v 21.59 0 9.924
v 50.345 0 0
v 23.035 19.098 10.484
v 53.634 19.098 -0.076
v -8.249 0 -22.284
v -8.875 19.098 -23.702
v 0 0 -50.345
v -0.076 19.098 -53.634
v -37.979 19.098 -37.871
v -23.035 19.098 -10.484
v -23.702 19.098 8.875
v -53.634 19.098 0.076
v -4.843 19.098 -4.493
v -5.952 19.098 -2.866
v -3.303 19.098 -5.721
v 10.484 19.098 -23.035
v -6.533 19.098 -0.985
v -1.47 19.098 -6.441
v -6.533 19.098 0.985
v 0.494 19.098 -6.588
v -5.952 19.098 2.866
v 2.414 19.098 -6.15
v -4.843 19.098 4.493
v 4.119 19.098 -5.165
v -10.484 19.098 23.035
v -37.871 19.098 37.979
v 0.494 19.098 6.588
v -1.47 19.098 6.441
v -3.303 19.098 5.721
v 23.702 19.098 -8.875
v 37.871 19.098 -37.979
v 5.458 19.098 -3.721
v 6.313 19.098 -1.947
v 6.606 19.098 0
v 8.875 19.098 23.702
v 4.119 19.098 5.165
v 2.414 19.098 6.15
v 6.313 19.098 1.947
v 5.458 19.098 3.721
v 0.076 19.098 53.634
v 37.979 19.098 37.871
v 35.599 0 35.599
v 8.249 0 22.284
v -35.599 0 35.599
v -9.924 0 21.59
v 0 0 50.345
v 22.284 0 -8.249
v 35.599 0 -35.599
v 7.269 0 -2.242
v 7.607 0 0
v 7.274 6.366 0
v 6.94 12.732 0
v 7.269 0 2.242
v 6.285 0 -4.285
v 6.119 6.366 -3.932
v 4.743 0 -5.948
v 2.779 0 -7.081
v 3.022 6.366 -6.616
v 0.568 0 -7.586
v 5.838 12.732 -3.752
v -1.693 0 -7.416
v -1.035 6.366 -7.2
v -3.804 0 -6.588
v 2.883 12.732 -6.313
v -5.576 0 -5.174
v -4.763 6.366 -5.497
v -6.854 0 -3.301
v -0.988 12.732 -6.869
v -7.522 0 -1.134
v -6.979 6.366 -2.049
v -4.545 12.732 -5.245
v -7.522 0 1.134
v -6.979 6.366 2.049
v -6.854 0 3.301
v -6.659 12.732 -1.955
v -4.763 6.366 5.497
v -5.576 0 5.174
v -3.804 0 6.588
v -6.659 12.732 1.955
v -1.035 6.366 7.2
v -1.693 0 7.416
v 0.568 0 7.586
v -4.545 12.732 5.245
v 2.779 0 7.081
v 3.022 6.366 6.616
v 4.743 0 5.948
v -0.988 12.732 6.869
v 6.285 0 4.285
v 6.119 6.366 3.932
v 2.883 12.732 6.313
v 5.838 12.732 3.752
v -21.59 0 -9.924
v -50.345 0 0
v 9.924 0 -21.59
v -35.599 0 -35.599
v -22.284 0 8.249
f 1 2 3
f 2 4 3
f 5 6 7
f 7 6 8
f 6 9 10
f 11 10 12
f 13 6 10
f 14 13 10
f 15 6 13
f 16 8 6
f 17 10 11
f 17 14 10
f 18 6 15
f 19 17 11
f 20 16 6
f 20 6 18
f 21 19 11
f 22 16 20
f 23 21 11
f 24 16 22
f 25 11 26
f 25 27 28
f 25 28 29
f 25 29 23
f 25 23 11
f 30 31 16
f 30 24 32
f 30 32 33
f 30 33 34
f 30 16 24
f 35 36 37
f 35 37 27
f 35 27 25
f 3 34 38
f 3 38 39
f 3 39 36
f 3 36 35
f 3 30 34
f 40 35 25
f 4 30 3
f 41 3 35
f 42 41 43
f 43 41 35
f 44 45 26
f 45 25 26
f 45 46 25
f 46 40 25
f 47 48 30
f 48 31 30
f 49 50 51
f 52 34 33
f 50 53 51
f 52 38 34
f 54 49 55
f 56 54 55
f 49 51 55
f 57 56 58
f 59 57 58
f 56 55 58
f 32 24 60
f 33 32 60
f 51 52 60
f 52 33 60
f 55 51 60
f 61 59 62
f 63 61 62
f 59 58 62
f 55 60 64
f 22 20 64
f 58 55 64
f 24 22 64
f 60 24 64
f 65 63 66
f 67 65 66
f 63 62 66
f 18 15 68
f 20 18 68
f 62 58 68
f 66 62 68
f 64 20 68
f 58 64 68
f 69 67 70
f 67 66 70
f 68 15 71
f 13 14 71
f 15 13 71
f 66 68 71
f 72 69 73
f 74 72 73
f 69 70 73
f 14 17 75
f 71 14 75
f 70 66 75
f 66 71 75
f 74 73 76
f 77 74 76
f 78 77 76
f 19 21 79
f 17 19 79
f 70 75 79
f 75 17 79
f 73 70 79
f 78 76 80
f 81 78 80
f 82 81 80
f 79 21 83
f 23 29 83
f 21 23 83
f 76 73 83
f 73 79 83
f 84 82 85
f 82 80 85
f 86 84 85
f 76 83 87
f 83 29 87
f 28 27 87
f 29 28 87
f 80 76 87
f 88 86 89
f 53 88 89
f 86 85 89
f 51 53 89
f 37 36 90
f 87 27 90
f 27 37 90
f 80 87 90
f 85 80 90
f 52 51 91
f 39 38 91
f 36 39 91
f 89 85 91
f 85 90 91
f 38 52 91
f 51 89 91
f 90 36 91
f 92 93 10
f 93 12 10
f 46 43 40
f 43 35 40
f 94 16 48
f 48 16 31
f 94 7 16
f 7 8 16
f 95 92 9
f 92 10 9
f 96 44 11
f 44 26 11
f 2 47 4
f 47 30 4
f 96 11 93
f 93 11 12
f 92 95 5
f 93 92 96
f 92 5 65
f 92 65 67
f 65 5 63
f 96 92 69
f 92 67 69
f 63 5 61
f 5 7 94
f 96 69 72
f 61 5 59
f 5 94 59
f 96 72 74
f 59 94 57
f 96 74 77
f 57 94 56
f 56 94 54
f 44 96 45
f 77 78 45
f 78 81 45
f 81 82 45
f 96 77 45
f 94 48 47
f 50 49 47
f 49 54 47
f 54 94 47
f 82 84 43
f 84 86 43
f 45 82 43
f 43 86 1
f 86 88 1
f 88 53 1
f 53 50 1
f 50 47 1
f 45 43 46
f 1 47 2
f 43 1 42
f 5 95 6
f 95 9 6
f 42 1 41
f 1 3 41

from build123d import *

# Parameters (mm, degrees)
F0_R     = 7.6071600852
F1_DEPTH = 19.09754
F1_TAPER = -3


with BuildPart() as f1:
    # F0 (on Front) → F1 (new body)
    with BuildSketch(Plane.XZ):
        with BuildLine():
            ThreePointArc((-4.6388319141, 18.7061527472), (-1.4012654558, 19.2217420452), (1.8768469353, 19.1811458915))
            Line((1.8768469353, 19.1811458915), (8.2491056776, 22.2835490331))
            Line((8.2491056776, 22.2835490331), (0, 50.3449775279))
            Line((0, 50.3449775279), (-9.9238500669, 21.5898471936))
            Line((-9.9238500669, 21.5898471936), (-4.6388319141, 18.7061527472))
        make_face()
        with BuildLine():
            Line((9.9238500669, -21.5898471936), (4.6388319141, -18.7061527472))
            ThreePointArc((4.6388319141, -18.7061527472), (1.4012654558, -19.2217420452), (-1.8768469353, -19.1811458915))
            Line((-1.8768469353, -19.1811458915), (-8.2491056776, -22.2835490331))
            Line((-8.2491056776, -22.2835490331), (0, -50.3449775279))
            Line((0, -50.3449775279), (9.9238500669, -21.5898471936))
        make_face()
        with BuildLine():
            Line((-8.2491056776, -22.2835490331), (-1.8768469353, -19.1811458915))
            ThreePointArc((-1.8768469353, -19.1811458915), (-6.0612417477, -18.294815129), (-9.9470979542, -16.5073969607))
            Line((-9.9470979542, -16.5073969607), (-8.2491056776, -22.2835490331))
        make_face()
        with BuildLine():
            ThreePointArc((18.7061527472, 4.6388319141), (19.1305766639, 2.3366532985), (19.2727505076, 0))
            ThreePointArc((19.2727505076, 0), (19.2498357311, -0.9395405559), (19.1811458915, -1.8768469353))
            Line((19.1811458915, -1.8768469353), (22.2835490331, -8.2491056776))
            Line((22.2835490331, -8.2491056776), (50.3449775279, 0))
            Line((50.3449775279, 0), (21.5898471936, 9.9238500669))
            Line((21.5898471936, 9.9238500669), (18.7061527472, 4.6388319141))
        make_face()
        with BuildLine():
            Line((22.2835490331, -8.2491056776), (16.5073969607, -9.9470979542))
            ThreePointArc((16.5073969607, -9.9470979542), (14.5826684524, -12.6009798404), (12.2359871356, -14.890249526))
            Line((12.2359871356, -14.890249526), (9.9238500669, -21.5898471936))
            Line((9.9238500669, -21.5898471936), (35.5992750086, -35.5992750086))
            Line((35.5992750086, -35.5992750086), (22.2835490331, -8.2491056776))
        make_face()
        with BuildLine():
            ThreePointArc((14.890249526, 12.2359871356), (17.2223329805, 8.6504426961), (18.7061527472, 4.6388319141))
            Line((18.7061527472, 4.6388319141), (21.5898471936, 9.9238500669))
            Line((21.5898471936, 9.9238500669), (14.890249526, 12.2359871356))
        make_face()
        with BuildLine():
            ThreePointArc((1.8768469353, 19.1811458915), (6.0612417477, 18.294815129), (9.9470979542, 16.5073969607))
            Line((9.9470979542, 16.5073969607), (8.2491056776, 22.2835490331))
            Line((8.2491056776, 22.2835490331), (1.8768469353, 19.1811458915))
        make_face()
        with BuildLine():
            ThreePointArc((-19.1811458915, 1.8768469353), (-18.294815129, 6.0612417477), (-16.5073969607, 9.9470979542))
            Line((-16.5073969607, 9.9470979542), (-22.2835490331, 8.2491056776))
            Line((-22.2835490331, 8.2491056776), (-19.1811458915, 1.8768469353))
        make_face()
        with BuildLine():
            ThreePointArc((-12.2359871356, 14.890249526), (-8.6504426961, 17.2223329805), (-4.6388319141, 18.7061527472))
            Line((-4.6388319141, 18.7061527472), (-9.9238500669, 21.5898471936))
            Line((-9.9238500669, 21.5898471936), (-12.2359871356, 14.890249526))
        make_face()
        with BuildLine():
            Line((-21.5898471936, -9.9238500669), (-14.890249526, -12.2359871356))
            ThreePointArc((-14.890249526, -12.2359871356), (-17.2223329805, -8.6504426961), (-18.7061527472, -4.6388319141))
            Line((-18.7061527472, -4.6388319141), (-21.5898471936, -9.9238500669))
        make_face()
        with BuildLine():
            Line((9.9238500669, -21.5898471936), (12.2359871356, -14.890249526))
            ThreePointArc((12.2359871356, -14.890249526), (8.6504426961, -17.2223329805), (4.6388319141, -18.7061527472))
            Line((4.6388319141, -18.7061527472), (9.9238500669, -21.5898471936))
        make_face()
        with BuildLine():
            Line((22.2835490331, -8.2491056776), (19.1811458915, -1.8768469353))
            ThreePointArc((19.1811458915, -1.8768469353), (18.294815129, -6.0612417477), (16.5073969607, -9.9470979542))
            Line((16.5073969607, -9.9470979542), (22.2835490331, -8.2491056776))
        make_face()
        with BuildLine():
            ThreePointArc((9.9470979542, 16.5073969607), (12.6009798404, 14.5826684524), (14.890249526, 12.2359871356))
            Line((14.890249526, 12.2359871356), (21.5898471936, 9.9238500669))
            Line((21.5898471936, 9.9238500669), (35.5992750086, 35.5992750086))
            Line((35.5992750086, 35.5992750086), (8.2491056776, 22.2835490331))
            Line((8.2491056776, 22.2835490331), (9.9470979542, 16.5073969607))
        make_face()
        with BuildLine():
            ThreePointArc((-16.5073969607, 9.9470979542), (-14.5826684524, 12.6009798404), (-12.2359871356, 14.890249526))
            Line((-12.2359871356, 14.890249526), (-9.9238500669, 21.5898471936))
            Line((-9.9238500669, 21.5898471936), (-35.5992750086, 35.5992750086))
            Line((-35.5992750086, 35.5992750086), (-22.2835490331, 8.2491056776))
            Line((-22.2835490331, 8.2491056776), (-16.5073969607, 9.9470979542))
        make_face()
        with BuildLine():
            ThreePointArc((-18.7061527472, -4.6388319141), (-19.2217420452, -1.4012654558), (-19.1811458915, 1.8768469353))
            Line((-19.1811458915, 1.8768469353), (-22.2835490331, 8.2491056776))
            Line((-22.2835490331, 8.2491056776), (-50.3449775279, 0))
            Line((-50.3449775279, 0), (-21.5898471936, -9.9238500669))
            Line((-21.5898471936, -9.9238500669), (-18.7061527472, -4.6388319141))
        make_face()
        with BuildLine():
            Line((-8.2491056776, -22.2835490331), (-9.9470979542, -16.5073969607))
            ThreePointArc((-9.9470979542, -16.5073969607), (-12.6009798404, -14.5826684524), (-14.890249526, -12.2359871356))
            Line((-14.890249526, -12.2359871356), (-21.5898471936, -9.9238500669))
            Line((-21.5898471936, -9.9238500669), (-35.5992750086, -35.5992750086))
            Line((-35.5992750086, -35.5992750086), (-8.2491056776, -22.2835490331))
        make_face()
        with BuildLine():
            ThreePointArc((19.1811458915, -1.8768469353), (19.2498357311, -0.9395405559), (19.2727505076, 0))
            ThreePointArc((19.2727505076, 0), (19.1305766639, 2.3366532985), (18.7061527472, 4.6388319141))
            ThreePointArc((18.7061527472, 4.6388319141), (17.2223329805, 8.6504426961), (14.890249526, 12.2359871356))
            ThreePointArc((14.890249526, 12.2359871356), (12.6009798404, 14.5826684524), (9.9470979542, 16.5073969607))
            ThreePointArc((9.9470979542, 16.5073969607), (6.0612417477, 18.294815129), (1.8768469353, 19.1811458915))
            ThreePointArc((1.8768469353, 19.1811458915), (-1.4012654558, 19.2217420452), (-4.6388319141, 18.7061527472))
            ThreePointArc((-4.6388319141, 18.7061527472), (-8.6504426961, 17.2223329805), (-12.2359871356, 14.890249526))
            ThreePointArc((-12.2359871356, 14.890249526), (-14.5826684524, 12.6009798404), (-16.5073969607, 9.9470979542))
            ThreePointArc((-16.5073969607, 9.9470979542), (-18.294815129, 6.0612417477), (-19.1811458915, 1.8768469353))
            ThreePointArc((-19.1811458915, 1.8768469353), (-19.2217420452, -1.4012654558), (-18.7061527472, -4.6388319141))
            ThreePointArc((-18.7061527472, -4.6388319141), (-17.2223329805, -8.6504426961), (-14.890249526, -12.2359871356))
            ThreePointArc((-14.890249526, -12.2359871356), (-12.6009798404, -14.5826684524), (-9.9470979542, -16.5073969607))
            ThreePointArc((-9.9470979542, -16.5073969607), (-6.0612417477, -18.294815129), (-1.8768469353, -19.1811458915))
            ThreePointArc((-1.8768469353, -19.1811458915), (1.4012654558, -19.2217420452), (4.6388319141, -18.7061527472))
            ThreePointArc((4.6388319141, -18.7061527472), (8.6504426961, -17.2223329805), (12.2359871356, -14.890249526))
            ThreePointArc((12.2359871356, -14.890249526), (14.5826684524, -12.6009798404), (16.5073969607, -9.9470979542))
            ThreePointArc((16.5073969607, -9.9470979542), (18.294815129, -6.0612417477), (19.1811458915, -1.8768469353))
        make_face()
        Circle(F0_R, mode=Mode.SUBTRACT)
    extrude(amount=-F1_DEPTH, taper=F1_TAPER)


solid = f1.part
